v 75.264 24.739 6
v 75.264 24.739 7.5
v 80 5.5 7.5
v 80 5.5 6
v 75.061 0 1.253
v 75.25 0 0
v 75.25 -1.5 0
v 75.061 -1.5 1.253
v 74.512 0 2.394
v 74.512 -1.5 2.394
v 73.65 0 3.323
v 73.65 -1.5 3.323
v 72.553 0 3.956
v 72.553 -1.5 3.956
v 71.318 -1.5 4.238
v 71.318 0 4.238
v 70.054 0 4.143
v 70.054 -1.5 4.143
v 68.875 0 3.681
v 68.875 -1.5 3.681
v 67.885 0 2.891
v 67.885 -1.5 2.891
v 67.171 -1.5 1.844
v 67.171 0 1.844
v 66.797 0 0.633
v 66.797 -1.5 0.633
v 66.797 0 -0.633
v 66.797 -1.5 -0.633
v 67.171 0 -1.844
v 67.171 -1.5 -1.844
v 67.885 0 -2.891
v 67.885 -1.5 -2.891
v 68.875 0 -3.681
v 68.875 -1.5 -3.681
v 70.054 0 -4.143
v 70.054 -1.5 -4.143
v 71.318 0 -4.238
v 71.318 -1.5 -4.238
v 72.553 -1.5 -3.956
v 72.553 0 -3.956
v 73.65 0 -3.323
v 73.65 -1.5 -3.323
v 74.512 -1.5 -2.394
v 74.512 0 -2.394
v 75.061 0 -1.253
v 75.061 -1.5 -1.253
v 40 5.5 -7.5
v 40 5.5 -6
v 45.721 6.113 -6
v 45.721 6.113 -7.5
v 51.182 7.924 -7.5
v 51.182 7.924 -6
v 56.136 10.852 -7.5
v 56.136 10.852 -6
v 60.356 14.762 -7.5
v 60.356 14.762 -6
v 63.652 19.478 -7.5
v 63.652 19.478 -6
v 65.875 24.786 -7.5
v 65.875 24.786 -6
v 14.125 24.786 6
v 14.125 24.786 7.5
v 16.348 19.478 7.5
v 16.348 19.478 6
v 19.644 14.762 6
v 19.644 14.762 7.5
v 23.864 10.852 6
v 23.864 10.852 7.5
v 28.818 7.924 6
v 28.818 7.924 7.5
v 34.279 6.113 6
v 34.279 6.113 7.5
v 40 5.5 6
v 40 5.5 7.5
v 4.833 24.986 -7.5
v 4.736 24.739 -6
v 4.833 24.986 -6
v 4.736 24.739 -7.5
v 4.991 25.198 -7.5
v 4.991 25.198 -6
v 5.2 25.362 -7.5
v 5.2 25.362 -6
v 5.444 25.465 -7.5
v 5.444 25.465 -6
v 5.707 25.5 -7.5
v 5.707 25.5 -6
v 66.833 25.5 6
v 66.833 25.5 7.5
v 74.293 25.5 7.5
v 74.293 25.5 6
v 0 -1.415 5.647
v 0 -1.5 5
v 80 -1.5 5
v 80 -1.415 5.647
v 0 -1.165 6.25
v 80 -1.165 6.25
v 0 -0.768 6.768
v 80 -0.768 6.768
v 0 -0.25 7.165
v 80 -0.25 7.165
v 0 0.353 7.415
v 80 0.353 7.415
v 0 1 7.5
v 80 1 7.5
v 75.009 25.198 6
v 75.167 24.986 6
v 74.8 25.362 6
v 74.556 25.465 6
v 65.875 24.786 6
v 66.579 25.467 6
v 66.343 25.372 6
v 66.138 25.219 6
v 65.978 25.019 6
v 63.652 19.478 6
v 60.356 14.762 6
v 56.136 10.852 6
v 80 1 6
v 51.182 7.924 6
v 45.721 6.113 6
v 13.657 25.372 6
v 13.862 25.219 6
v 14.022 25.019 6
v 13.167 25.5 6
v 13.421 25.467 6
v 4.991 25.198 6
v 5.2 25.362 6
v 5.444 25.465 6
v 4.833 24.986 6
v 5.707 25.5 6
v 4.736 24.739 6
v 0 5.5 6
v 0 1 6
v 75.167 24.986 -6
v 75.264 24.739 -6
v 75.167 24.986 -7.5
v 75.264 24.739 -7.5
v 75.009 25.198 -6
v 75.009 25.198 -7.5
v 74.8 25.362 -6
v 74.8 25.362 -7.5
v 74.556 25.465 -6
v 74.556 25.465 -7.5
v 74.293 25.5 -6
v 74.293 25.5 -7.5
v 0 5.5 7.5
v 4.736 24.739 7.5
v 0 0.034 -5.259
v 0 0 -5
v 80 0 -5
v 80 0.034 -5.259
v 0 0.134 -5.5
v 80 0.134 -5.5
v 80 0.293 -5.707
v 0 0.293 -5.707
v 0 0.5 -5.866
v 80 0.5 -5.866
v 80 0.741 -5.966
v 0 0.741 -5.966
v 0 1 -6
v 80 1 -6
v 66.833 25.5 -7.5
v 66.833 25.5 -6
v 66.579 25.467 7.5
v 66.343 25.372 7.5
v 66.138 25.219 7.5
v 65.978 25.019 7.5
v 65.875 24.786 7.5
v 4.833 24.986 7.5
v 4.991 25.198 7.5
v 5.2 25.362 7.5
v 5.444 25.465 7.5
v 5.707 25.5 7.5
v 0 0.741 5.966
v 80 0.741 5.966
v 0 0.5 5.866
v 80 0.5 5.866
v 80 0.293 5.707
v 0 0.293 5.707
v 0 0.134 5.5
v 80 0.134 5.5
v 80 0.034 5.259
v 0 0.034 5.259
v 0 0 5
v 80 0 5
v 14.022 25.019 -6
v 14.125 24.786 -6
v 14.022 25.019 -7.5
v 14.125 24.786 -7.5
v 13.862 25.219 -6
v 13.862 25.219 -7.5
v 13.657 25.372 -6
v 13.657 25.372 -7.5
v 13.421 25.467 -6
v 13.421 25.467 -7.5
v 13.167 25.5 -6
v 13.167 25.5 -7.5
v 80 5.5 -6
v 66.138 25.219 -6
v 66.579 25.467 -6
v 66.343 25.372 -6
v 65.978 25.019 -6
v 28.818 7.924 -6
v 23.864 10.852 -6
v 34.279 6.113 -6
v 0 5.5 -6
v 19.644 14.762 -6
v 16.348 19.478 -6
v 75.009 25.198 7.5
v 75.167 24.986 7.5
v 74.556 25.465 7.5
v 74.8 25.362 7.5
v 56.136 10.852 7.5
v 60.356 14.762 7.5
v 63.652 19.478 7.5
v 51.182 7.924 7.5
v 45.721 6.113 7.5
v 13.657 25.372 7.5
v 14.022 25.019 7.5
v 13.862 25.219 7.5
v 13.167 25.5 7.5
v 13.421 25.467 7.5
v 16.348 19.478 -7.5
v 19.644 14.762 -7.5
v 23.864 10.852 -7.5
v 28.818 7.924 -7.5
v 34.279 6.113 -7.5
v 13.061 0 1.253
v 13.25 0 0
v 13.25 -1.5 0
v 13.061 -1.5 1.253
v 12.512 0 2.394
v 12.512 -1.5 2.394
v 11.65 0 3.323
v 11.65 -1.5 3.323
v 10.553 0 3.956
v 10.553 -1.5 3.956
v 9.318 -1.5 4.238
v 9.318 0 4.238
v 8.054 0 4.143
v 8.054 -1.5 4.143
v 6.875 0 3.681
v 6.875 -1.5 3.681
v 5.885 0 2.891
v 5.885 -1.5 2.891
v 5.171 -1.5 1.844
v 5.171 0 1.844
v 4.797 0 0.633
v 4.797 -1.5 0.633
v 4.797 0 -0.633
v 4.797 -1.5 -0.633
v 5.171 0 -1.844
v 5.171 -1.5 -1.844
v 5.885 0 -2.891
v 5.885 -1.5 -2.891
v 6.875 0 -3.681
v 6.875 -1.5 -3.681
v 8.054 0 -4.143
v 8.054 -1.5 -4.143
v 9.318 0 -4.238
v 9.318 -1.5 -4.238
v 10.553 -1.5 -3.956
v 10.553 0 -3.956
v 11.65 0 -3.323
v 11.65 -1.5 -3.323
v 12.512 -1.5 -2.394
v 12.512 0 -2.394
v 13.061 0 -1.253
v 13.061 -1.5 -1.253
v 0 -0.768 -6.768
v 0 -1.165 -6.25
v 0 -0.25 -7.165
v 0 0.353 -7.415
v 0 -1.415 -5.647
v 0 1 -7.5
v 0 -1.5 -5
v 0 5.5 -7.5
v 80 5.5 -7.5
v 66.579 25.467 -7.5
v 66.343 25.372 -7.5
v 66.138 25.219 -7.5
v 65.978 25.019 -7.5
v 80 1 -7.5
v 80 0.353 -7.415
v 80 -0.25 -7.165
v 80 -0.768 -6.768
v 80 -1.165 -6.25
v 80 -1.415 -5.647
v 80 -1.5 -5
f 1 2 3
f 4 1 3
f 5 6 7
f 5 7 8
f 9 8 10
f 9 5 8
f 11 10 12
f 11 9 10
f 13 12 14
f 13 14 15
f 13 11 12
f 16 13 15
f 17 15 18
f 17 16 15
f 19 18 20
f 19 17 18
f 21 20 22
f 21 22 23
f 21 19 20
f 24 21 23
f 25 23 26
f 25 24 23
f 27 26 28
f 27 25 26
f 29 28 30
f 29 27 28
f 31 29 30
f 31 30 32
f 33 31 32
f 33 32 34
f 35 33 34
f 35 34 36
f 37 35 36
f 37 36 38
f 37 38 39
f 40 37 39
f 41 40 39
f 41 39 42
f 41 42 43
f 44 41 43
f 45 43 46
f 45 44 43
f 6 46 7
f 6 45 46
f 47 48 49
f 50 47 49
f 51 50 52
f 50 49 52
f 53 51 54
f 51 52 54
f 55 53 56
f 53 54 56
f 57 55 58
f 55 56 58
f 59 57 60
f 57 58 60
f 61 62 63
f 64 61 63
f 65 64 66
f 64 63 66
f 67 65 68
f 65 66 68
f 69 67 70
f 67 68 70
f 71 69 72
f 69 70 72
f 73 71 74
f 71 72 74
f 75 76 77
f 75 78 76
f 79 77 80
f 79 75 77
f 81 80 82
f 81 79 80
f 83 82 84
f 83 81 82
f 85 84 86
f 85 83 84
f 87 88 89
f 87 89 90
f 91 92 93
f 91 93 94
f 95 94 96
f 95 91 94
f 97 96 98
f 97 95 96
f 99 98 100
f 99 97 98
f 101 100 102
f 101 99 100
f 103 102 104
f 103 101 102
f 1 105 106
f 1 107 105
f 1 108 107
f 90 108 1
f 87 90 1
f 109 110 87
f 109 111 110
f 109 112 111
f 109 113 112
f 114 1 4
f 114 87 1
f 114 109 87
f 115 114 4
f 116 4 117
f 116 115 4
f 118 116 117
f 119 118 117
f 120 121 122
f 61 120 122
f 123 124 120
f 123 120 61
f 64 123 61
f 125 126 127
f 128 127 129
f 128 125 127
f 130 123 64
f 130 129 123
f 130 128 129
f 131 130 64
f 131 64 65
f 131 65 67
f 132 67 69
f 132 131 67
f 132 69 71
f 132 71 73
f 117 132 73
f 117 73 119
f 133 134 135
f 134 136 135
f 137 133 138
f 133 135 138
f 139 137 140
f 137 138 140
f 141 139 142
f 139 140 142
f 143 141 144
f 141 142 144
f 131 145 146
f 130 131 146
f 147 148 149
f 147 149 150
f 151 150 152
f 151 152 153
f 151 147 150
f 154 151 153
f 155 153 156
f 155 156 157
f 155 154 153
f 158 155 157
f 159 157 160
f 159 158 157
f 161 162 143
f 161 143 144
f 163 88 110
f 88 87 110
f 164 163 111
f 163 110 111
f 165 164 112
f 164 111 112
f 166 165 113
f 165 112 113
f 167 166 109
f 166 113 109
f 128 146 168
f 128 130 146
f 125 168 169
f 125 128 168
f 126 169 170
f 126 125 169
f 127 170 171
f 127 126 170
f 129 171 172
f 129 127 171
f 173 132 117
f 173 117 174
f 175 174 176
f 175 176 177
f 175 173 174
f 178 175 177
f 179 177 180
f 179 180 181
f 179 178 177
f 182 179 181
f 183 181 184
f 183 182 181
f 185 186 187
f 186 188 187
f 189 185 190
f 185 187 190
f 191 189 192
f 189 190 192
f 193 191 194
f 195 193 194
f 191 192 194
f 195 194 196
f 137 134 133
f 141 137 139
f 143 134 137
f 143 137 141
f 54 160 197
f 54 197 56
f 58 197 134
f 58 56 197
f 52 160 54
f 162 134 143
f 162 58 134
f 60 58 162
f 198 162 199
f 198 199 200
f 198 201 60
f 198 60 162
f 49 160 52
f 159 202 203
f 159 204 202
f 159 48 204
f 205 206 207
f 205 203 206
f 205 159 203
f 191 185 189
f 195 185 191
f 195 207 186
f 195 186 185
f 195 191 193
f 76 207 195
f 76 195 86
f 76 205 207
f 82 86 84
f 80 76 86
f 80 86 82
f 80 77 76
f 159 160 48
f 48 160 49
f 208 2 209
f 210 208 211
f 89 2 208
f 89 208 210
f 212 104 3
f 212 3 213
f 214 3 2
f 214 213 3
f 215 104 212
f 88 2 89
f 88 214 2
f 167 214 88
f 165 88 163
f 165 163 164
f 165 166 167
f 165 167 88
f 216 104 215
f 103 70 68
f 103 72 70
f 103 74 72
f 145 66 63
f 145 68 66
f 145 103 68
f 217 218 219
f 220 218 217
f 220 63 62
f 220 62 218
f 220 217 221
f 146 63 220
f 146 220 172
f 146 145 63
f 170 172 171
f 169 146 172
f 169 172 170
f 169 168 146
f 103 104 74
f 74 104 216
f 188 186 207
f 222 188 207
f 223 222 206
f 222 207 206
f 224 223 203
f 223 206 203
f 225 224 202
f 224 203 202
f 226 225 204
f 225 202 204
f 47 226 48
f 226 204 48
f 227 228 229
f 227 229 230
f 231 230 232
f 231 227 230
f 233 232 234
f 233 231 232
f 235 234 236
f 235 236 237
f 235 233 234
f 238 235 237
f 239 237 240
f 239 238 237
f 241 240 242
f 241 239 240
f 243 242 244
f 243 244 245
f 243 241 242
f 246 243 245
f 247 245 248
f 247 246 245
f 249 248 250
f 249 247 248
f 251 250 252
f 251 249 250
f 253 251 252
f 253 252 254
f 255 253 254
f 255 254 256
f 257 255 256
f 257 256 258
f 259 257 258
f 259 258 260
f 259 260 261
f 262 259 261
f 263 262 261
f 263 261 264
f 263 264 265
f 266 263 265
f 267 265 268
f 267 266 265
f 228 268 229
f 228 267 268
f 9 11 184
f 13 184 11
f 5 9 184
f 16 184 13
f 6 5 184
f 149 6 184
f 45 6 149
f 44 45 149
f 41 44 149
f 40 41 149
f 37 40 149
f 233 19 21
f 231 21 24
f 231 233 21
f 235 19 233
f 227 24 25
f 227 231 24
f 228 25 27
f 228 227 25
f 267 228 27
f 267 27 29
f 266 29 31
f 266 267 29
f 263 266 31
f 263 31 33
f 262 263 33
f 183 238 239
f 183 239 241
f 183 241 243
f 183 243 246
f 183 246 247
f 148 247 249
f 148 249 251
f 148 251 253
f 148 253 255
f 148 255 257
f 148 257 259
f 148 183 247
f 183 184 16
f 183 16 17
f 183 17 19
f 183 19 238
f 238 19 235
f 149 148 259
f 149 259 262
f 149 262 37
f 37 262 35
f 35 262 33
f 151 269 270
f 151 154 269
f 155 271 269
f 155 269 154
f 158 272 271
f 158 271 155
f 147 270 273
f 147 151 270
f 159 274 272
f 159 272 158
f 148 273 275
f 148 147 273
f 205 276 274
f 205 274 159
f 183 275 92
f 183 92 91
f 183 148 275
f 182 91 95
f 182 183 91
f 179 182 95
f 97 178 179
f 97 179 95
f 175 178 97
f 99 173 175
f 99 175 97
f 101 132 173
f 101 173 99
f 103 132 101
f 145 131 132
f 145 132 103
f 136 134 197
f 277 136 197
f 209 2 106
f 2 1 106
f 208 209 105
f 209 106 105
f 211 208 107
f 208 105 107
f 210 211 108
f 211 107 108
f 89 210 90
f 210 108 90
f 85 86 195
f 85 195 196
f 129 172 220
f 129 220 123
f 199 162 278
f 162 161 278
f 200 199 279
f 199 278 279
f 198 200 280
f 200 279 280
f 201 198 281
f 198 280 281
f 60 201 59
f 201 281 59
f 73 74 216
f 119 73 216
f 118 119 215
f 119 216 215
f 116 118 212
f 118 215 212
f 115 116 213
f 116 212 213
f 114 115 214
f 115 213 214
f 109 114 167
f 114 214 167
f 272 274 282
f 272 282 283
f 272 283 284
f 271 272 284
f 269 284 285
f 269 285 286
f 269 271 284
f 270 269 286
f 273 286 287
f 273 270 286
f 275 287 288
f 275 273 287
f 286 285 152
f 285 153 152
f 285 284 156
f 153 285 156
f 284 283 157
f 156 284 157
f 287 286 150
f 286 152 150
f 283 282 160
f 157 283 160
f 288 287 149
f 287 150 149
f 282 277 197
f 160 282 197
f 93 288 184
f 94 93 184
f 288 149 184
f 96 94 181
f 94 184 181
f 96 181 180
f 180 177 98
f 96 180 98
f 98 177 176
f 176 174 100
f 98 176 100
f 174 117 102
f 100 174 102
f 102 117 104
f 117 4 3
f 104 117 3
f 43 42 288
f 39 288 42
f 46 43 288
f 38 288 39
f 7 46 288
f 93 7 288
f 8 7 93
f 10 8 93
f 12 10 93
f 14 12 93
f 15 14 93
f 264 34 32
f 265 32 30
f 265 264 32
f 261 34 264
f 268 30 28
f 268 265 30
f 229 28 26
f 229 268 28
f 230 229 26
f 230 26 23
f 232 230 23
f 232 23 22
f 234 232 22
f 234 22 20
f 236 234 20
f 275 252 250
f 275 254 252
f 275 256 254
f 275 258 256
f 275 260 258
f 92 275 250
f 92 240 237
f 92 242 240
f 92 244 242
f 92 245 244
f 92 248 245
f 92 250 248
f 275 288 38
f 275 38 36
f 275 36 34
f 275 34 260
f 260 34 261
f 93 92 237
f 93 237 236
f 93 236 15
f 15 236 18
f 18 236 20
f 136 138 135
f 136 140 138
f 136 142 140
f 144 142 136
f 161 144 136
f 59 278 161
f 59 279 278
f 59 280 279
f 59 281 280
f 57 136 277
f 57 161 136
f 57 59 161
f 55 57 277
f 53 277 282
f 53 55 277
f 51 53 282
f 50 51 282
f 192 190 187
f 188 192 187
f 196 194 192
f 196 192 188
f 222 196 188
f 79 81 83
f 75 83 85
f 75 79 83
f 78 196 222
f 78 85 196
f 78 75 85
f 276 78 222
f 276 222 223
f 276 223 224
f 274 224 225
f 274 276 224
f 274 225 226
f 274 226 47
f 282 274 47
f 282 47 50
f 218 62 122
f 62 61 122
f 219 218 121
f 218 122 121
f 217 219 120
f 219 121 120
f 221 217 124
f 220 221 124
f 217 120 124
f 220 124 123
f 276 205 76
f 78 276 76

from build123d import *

# Parameters (mm, degrees)
SM_BASE_FLANGE_1_DEPTH = 80
CUT_EXTRUDE_1_DEPTH    = 35
FILLET_1_R             = 1
EXTRUDE_START          = -1.5
EXTRUDE_1_OUTLINE_R    = 4.25
EXTRUDE_1_DEPTH        = 1.5


# Read off the part's stored shape, not the designer's step: Бобышка-Вытянуть1
# Sheet-metal steps are written as plain solids
with BuildPart() as part:
    # Sketch 1 → Базовая кромка1 (new body)
    with BuildSketch(Plane(origin=(0, 0, 0), x_dir=(0, 0, -1), z_dir=(1, 0, 0))):
        with BuildLine():
            Line((-6, 25.5), (-6, 1))
            ThreePointArc((-6, 1), (-5.707106781, 0.292893219), (-5, 0))
            Line((-5, 0), (5, 0))
            ThreePointArc((5, 0), (5.707106781, 0.292893219), (6, 1))
            Line((6, 1), (6, 25.5))
            Line((6, 25.5), (7.5, 25.5))
            Line((7.5, 25.5), (7.5, 1))
            ThreePointArc((7.5, 1), (6.767766953, -0.767766953), (5, -1.5))
            Line((5, -1.5), (-5, -1.5))
            ThreePointArc((-5, -1.5), (-6.767766953, -0.767766953), (-7.5, 1))
            Line((-7.5, 1), (-7.5, 25.5))
            Line((-7.5, 25.5), (-6, 25.5))
        make_face()
    extrude(amount=SM_BASE_FLANGE_1_DEPTH)

    # Эскиз6 → Вырез-Вытянуть1 (cut)
    with BuildSketch(Plane.XY.offset(7.5)):
        Polygon((80, 25.5), (75.076809621, 25.5), (80, 5.5), align=None)
        with BuildLine():
            ThreePointArc((13.923190379, 25.5), (23.568323275, 11.075714714), (40, 5.5))
            Line((40, 5.5), (40, 25.5))
            Line((40, 25.5), (13.923190379, 25.5))
        make_face()
        with BuildLine():
            Line((40, 25.5), (40, 5.5))
            ThreePointArc((40, 5.5), (56.431676725, 11.075714714), (66.076809621, 25.5))
            Line((66.076809621, 25.5), (40, 25.5))
        make_face()
        Polygon((0, 5.5), (4.923190379, 25.5), (0, 25.5), align=None)
    extrude(amount=-CUT_EXTRUDE_1_DEPTH, mode=Mode.SUBTRACT)

    # Скругление1
    fillet_1_edges = [part.edges().sort_by_distance(p)[0] for p in [
        (75.076809621, 25.5, -6.75),
        (75.076809621, 25.5, 6.75),
        (13.923190379, 25.5, -6.75),
        (66.076809621, 25.5, -6.75),
        (13.923190379, 25.5, 6.75),
        (66.076809621, 25.5, 6.75),
        (4.923190379, 25.5, -6.75),
        (4.923190379, 25.5, 6.75),
    ]]
    fillet(fillet_1_edges, radius=FILLET_1_R)

    # Бобышка-Вытянуть1 outline → Бобышка-Вытянуть1 (cut)
    with BuildSketch(Plane.XZ.offset(1.5).offset(EXTRUDE_START)):
        with Locations((71, 0)):
            Circle(EXTRUDE_1_OUTLINE_R)
        with Locations((9, 0)):
            Circle(EXTRUDE_1_OUTLINE_R)
    extrude(amount=EXTRUDE_1_DEPTH, mode=Mode.SUBTRACT)


solid = part.part
